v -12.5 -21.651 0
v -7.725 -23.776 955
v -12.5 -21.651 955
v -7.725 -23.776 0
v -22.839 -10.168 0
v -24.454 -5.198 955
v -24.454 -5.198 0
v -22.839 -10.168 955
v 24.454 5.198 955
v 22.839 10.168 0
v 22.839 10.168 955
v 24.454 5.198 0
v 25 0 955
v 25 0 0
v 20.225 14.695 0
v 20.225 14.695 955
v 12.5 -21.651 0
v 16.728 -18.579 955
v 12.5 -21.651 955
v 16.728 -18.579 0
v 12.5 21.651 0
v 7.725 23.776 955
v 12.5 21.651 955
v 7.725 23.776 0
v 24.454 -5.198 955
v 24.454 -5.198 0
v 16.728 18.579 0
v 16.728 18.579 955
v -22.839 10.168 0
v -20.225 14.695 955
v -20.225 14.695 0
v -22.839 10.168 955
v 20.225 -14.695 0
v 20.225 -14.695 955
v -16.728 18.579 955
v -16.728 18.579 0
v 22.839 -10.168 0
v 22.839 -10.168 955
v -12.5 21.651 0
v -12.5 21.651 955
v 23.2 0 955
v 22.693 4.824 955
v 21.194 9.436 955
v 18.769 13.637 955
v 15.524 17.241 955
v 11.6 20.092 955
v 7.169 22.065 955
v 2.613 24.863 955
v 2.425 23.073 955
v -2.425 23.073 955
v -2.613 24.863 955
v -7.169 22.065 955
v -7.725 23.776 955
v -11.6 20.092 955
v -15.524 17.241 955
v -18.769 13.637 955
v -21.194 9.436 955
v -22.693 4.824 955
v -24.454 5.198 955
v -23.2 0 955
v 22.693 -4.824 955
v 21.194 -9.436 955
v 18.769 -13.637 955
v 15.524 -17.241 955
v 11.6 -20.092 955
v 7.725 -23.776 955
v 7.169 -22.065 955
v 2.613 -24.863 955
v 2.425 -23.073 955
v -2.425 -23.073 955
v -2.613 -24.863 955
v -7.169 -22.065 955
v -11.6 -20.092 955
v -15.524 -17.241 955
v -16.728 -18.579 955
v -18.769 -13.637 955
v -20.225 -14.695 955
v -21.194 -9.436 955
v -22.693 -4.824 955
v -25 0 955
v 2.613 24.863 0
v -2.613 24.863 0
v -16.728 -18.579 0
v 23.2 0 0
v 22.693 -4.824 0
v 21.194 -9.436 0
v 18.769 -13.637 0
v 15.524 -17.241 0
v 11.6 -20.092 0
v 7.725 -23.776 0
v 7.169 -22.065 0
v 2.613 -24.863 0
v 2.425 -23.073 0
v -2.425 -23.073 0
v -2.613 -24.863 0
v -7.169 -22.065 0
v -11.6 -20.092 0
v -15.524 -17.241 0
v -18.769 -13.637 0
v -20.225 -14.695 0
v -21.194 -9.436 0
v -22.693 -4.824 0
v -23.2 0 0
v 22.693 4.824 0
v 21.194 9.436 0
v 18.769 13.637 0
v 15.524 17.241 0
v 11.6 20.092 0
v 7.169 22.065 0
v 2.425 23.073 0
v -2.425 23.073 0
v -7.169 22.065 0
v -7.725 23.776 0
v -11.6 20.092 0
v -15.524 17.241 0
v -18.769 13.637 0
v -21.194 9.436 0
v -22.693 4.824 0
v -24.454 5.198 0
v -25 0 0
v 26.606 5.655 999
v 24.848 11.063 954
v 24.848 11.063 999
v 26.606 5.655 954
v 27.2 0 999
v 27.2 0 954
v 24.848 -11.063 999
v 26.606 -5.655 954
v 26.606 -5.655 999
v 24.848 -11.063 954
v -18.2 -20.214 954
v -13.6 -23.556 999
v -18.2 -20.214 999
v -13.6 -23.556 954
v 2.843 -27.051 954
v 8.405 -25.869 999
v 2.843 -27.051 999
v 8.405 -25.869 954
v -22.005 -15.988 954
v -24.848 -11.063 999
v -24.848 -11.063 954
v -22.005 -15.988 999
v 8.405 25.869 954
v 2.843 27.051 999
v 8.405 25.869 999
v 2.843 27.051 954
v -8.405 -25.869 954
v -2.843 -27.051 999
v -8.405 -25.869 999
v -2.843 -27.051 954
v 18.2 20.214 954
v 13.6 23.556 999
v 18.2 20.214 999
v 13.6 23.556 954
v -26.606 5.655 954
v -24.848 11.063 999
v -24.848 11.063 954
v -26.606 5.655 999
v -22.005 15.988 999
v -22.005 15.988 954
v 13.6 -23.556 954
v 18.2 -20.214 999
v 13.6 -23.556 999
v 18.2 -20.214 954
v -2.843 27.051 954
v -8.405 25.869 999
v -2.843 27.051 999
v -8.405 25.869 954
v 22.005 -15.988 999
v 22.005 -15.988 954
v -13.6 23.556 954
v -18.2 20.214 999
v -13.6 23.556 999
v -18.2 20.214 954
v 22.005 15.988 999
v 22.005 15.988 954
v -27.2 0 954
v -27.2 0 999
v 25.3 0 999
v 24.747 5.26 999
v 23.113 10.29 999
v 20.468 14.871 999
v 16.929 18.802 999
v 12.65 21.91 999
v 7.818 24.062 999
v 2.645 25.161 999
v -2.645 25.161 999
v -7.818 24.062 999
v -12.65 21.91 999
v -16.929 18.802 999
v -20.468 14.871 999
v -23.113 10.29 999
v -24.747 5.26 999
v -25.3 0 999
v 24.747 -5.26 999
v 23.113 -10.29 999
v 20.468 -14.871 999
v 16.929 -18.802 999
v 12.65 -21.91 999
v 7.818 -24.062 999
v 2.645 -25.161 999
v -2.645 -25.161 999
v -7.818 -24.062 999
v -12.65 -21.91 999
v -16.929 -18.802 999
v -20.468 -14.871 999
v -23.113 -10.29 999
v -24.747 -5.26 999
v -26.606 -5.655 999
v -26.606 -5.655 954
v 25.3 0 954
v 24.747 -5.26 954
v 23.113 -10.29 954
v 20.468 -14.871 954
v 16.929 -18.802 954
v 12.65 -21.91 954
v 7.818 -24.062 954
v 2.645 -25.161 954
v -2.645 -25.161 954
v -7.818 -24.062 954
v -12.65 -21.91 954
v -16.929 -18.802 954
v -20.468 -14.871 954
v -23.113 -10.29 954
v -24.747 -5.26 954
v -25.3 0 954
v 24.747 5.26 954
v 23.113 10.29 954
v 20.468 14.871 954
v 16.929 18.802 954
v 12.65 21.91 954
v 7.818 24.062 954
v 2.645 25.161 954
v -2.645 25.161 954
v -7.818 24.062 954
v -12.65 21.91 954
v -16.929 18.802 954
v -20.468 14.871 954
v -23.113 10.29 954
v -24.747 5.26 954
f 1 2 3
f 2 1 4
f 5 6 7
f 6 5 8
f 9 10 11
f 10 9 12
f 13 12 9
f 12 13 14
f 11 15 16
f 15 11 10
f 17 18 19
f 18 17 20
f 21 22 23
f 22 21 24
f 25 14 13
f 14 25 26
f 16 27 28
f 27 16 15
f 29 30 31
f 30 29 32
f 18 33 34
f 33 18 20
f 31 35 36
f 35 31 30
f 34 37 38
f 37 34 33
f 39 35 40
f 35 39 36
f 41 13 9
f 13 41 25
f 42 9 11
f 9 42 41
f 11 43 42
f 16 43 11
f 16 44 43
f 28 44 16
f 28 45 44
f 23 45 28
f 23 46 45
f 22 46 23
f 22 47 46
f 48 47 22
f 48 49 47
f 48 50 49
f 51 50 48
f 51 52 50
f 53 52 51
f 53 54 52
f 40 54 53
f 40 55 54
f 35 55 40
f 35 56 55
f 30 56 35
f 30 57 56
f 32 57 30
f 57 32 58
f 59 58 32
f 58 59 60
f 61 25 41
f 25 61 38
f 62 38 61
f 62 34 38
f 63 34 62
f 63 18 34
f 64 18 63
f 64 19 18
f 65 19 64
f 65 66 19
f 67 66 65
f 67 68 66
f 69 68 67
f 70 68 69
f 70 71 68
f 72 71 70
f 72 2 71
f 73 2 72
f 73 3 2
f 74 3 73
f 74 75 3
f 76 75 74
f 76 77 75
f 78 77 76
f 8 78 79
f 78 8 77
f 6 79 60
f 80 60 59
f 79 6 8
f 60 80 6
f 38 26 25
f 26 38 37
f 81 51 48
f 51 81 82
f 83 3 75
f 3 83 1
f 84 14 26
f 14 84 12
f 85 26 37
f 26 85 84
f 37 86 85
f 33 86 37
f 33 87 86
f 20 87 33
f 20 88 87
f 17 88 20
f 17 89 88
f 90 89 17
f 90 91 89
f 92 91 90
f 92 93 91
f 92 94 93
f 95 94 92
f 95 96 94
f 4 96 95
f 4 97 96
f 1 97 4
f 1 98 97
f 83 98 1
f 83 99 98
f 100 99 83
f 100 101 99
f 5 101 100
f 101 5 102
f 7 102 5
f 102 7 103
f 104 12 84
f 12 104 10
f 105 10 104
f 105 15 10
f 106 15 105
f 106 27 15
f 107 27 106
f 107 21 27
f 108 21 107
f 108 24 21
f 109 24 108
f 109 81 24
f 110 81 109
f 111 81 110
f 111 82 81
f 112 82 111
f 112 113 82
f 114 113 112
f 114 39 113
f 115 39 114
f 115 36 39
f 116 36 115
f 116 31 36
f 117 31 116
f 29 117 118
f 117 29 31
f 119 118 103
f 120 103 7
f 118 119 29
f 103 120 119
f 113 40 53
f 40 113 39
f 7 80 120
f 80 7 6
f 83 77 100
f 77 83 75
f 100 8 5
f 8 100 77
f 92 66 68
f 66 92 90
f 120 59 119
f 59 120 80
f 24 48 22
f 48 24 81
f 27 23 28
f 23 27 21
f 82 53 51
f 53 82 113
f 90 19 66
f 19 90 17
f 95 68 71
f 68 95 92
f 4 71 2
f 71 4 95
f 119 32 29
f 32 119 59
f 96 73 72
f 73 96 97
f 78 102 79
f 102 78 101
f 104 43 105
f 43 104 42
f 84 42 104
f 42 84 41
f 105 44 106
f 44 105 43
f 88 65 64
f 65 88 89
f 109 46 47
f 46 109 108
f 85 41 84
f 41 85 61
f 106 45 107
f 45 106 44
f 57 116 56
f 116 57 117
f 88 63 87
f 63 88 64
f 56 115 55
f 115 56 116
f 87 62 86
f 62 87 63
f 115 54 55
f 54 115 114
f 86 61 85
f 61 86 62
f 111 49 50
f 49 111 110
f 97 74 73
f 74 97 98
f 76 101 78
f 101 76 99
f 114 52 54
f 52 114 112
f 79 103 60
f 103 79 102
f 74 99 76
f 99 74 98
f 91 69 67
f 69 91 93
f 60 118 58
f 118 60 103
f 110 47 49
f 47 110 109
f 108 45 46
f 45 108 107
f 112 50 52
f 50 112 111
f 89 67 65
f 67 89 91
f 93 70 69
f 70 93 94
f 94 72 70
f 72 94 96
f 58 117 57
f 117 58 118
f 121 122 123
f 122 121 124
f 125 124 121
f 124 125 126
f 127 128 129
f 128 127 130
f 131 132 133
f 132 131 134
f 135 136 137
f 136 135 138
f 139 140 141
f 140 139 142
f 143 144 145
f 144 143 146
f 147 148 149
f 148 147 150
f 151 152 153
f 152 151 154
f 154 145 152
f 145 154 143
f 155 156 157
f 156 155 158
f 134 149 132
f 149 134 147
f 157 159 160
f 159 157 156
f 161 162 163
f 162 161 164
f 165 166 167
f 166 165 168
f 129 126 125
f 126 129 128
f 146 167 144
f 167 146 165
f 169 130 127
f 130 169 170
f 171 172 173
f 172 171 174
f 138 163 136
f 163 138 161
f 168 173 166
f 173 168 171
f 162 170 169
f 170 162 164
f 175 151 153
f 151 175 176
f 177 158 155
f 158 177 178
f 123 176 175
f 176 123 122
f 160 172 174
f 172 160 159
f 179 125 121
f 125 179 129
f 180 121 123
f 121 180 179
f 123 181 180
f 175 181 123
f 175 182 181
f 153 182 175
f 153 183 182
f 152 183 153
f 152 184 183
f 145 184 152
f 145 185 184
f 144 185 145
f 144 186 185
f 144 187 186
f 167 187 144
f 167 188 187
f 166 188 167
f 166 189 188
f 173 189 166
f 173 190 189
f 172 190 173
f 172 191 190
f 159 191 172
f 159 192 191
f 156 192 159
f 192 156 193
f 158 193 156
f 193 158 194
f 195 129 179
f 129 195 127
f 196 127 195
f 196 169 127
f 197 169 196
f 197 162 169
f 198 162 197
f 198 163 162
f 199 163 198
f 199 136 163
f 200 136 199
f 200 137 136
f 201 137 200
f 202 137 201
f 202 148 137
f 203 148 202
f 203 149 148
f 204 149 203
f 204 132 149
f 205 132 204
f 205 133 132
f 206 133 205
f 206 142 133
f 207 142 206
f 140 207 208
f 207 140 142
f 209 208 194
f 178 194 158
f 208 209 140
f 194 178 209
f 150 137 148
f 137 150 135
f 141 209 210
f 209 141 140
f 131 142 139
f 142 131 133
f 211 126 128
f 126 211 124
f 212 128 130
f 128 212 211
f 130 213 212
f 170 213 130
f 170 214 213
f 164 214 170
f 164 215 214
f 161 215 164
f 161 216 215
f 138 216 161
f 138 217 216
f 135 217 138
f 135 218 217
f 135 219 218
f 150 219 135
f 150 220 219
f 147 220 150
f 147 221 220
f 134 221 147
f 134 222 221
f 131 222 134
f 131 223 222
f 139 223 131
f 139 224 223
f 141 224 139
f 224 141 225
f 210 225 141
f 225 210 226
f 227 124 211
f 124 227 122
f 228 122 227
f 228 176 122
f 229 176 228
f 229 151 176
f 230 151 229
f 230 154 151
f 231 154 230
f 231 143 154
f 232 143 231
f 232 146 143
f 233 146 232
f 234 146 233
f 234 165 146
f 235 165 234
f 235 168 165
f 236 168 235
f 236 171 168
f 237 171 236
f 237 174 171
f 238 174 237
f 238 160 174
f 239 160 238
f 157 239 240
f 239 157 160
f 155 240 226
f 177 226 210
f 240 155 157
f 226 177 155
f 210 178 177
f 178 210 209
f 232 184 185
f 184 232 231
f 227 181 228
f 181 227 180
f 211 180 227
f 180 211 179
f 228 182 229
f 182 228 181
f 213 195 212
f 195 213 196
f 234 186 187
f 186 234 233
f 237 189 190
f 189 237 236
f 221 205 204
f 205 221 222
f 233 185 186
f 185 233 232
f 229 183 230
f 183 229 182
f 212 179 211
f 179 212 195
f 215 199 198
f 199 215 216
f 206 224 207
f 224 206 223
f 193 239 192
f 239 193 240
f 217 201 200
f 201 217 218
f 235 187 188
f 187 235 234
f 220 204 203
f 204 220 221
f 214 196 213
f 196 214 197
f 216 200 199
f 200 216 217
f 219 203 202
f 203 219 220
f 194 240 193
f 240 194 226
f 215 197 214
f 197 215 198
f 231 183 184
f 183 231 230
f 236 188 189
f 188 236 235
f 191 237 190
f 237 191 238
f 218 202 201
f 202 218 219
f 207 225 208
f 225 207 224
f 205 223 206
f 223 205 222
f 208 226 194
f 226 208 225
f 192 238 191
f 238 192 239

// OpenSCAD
// Parameters
nominal_size = 50; //[25:100:1]
length_mm = 1000; //[500:2000:10]
pipe_od = 50; //[25:100:1]
pipe_wall = 1.8; //[0.9:3.6:0.1]
fitting_length = 45; //[20:90:1]
fitting_wall_extra = 2.2; //[1.0:5.0:0.1]
fitting_id_clearance = 0.6; //[0.2:1.5:0.1]
overlap = 1; //[0.5:2:0.1]

// HT Pipe Segment - Complete Geometry
module ht_pipe() {
  color([0.85, 0.85, 0.8]) { // PVC color
    union() {
      // Pipe segment
      difference() {
        cylinder(h=length_mm - fitting_length, r=pipe_od/2, center=false);
        translate([0, 0, 0])
          cylinder(h=length_mm - fitting_length + overlap, r=pipe_od/2 - pipe_wall, center=false);
      }
      
      // End fitting
      difference() {
        translate([0, 0, length_mm - fitting_length - overlap])
          cylinder(h=fitting_length, r=pipe_od/2 + fitting_wall_extra, center=false);
        translate([0, 0, length_mm - fitting_length - overlap])
          cylinder(h=fitting_length + overlap, r=pipe_od/2 + fitting_id_clearance/2, center=false);
      }
    }
  }
}

// Assembly
module assembly() {
  ht_pipe();
}

assembly();
